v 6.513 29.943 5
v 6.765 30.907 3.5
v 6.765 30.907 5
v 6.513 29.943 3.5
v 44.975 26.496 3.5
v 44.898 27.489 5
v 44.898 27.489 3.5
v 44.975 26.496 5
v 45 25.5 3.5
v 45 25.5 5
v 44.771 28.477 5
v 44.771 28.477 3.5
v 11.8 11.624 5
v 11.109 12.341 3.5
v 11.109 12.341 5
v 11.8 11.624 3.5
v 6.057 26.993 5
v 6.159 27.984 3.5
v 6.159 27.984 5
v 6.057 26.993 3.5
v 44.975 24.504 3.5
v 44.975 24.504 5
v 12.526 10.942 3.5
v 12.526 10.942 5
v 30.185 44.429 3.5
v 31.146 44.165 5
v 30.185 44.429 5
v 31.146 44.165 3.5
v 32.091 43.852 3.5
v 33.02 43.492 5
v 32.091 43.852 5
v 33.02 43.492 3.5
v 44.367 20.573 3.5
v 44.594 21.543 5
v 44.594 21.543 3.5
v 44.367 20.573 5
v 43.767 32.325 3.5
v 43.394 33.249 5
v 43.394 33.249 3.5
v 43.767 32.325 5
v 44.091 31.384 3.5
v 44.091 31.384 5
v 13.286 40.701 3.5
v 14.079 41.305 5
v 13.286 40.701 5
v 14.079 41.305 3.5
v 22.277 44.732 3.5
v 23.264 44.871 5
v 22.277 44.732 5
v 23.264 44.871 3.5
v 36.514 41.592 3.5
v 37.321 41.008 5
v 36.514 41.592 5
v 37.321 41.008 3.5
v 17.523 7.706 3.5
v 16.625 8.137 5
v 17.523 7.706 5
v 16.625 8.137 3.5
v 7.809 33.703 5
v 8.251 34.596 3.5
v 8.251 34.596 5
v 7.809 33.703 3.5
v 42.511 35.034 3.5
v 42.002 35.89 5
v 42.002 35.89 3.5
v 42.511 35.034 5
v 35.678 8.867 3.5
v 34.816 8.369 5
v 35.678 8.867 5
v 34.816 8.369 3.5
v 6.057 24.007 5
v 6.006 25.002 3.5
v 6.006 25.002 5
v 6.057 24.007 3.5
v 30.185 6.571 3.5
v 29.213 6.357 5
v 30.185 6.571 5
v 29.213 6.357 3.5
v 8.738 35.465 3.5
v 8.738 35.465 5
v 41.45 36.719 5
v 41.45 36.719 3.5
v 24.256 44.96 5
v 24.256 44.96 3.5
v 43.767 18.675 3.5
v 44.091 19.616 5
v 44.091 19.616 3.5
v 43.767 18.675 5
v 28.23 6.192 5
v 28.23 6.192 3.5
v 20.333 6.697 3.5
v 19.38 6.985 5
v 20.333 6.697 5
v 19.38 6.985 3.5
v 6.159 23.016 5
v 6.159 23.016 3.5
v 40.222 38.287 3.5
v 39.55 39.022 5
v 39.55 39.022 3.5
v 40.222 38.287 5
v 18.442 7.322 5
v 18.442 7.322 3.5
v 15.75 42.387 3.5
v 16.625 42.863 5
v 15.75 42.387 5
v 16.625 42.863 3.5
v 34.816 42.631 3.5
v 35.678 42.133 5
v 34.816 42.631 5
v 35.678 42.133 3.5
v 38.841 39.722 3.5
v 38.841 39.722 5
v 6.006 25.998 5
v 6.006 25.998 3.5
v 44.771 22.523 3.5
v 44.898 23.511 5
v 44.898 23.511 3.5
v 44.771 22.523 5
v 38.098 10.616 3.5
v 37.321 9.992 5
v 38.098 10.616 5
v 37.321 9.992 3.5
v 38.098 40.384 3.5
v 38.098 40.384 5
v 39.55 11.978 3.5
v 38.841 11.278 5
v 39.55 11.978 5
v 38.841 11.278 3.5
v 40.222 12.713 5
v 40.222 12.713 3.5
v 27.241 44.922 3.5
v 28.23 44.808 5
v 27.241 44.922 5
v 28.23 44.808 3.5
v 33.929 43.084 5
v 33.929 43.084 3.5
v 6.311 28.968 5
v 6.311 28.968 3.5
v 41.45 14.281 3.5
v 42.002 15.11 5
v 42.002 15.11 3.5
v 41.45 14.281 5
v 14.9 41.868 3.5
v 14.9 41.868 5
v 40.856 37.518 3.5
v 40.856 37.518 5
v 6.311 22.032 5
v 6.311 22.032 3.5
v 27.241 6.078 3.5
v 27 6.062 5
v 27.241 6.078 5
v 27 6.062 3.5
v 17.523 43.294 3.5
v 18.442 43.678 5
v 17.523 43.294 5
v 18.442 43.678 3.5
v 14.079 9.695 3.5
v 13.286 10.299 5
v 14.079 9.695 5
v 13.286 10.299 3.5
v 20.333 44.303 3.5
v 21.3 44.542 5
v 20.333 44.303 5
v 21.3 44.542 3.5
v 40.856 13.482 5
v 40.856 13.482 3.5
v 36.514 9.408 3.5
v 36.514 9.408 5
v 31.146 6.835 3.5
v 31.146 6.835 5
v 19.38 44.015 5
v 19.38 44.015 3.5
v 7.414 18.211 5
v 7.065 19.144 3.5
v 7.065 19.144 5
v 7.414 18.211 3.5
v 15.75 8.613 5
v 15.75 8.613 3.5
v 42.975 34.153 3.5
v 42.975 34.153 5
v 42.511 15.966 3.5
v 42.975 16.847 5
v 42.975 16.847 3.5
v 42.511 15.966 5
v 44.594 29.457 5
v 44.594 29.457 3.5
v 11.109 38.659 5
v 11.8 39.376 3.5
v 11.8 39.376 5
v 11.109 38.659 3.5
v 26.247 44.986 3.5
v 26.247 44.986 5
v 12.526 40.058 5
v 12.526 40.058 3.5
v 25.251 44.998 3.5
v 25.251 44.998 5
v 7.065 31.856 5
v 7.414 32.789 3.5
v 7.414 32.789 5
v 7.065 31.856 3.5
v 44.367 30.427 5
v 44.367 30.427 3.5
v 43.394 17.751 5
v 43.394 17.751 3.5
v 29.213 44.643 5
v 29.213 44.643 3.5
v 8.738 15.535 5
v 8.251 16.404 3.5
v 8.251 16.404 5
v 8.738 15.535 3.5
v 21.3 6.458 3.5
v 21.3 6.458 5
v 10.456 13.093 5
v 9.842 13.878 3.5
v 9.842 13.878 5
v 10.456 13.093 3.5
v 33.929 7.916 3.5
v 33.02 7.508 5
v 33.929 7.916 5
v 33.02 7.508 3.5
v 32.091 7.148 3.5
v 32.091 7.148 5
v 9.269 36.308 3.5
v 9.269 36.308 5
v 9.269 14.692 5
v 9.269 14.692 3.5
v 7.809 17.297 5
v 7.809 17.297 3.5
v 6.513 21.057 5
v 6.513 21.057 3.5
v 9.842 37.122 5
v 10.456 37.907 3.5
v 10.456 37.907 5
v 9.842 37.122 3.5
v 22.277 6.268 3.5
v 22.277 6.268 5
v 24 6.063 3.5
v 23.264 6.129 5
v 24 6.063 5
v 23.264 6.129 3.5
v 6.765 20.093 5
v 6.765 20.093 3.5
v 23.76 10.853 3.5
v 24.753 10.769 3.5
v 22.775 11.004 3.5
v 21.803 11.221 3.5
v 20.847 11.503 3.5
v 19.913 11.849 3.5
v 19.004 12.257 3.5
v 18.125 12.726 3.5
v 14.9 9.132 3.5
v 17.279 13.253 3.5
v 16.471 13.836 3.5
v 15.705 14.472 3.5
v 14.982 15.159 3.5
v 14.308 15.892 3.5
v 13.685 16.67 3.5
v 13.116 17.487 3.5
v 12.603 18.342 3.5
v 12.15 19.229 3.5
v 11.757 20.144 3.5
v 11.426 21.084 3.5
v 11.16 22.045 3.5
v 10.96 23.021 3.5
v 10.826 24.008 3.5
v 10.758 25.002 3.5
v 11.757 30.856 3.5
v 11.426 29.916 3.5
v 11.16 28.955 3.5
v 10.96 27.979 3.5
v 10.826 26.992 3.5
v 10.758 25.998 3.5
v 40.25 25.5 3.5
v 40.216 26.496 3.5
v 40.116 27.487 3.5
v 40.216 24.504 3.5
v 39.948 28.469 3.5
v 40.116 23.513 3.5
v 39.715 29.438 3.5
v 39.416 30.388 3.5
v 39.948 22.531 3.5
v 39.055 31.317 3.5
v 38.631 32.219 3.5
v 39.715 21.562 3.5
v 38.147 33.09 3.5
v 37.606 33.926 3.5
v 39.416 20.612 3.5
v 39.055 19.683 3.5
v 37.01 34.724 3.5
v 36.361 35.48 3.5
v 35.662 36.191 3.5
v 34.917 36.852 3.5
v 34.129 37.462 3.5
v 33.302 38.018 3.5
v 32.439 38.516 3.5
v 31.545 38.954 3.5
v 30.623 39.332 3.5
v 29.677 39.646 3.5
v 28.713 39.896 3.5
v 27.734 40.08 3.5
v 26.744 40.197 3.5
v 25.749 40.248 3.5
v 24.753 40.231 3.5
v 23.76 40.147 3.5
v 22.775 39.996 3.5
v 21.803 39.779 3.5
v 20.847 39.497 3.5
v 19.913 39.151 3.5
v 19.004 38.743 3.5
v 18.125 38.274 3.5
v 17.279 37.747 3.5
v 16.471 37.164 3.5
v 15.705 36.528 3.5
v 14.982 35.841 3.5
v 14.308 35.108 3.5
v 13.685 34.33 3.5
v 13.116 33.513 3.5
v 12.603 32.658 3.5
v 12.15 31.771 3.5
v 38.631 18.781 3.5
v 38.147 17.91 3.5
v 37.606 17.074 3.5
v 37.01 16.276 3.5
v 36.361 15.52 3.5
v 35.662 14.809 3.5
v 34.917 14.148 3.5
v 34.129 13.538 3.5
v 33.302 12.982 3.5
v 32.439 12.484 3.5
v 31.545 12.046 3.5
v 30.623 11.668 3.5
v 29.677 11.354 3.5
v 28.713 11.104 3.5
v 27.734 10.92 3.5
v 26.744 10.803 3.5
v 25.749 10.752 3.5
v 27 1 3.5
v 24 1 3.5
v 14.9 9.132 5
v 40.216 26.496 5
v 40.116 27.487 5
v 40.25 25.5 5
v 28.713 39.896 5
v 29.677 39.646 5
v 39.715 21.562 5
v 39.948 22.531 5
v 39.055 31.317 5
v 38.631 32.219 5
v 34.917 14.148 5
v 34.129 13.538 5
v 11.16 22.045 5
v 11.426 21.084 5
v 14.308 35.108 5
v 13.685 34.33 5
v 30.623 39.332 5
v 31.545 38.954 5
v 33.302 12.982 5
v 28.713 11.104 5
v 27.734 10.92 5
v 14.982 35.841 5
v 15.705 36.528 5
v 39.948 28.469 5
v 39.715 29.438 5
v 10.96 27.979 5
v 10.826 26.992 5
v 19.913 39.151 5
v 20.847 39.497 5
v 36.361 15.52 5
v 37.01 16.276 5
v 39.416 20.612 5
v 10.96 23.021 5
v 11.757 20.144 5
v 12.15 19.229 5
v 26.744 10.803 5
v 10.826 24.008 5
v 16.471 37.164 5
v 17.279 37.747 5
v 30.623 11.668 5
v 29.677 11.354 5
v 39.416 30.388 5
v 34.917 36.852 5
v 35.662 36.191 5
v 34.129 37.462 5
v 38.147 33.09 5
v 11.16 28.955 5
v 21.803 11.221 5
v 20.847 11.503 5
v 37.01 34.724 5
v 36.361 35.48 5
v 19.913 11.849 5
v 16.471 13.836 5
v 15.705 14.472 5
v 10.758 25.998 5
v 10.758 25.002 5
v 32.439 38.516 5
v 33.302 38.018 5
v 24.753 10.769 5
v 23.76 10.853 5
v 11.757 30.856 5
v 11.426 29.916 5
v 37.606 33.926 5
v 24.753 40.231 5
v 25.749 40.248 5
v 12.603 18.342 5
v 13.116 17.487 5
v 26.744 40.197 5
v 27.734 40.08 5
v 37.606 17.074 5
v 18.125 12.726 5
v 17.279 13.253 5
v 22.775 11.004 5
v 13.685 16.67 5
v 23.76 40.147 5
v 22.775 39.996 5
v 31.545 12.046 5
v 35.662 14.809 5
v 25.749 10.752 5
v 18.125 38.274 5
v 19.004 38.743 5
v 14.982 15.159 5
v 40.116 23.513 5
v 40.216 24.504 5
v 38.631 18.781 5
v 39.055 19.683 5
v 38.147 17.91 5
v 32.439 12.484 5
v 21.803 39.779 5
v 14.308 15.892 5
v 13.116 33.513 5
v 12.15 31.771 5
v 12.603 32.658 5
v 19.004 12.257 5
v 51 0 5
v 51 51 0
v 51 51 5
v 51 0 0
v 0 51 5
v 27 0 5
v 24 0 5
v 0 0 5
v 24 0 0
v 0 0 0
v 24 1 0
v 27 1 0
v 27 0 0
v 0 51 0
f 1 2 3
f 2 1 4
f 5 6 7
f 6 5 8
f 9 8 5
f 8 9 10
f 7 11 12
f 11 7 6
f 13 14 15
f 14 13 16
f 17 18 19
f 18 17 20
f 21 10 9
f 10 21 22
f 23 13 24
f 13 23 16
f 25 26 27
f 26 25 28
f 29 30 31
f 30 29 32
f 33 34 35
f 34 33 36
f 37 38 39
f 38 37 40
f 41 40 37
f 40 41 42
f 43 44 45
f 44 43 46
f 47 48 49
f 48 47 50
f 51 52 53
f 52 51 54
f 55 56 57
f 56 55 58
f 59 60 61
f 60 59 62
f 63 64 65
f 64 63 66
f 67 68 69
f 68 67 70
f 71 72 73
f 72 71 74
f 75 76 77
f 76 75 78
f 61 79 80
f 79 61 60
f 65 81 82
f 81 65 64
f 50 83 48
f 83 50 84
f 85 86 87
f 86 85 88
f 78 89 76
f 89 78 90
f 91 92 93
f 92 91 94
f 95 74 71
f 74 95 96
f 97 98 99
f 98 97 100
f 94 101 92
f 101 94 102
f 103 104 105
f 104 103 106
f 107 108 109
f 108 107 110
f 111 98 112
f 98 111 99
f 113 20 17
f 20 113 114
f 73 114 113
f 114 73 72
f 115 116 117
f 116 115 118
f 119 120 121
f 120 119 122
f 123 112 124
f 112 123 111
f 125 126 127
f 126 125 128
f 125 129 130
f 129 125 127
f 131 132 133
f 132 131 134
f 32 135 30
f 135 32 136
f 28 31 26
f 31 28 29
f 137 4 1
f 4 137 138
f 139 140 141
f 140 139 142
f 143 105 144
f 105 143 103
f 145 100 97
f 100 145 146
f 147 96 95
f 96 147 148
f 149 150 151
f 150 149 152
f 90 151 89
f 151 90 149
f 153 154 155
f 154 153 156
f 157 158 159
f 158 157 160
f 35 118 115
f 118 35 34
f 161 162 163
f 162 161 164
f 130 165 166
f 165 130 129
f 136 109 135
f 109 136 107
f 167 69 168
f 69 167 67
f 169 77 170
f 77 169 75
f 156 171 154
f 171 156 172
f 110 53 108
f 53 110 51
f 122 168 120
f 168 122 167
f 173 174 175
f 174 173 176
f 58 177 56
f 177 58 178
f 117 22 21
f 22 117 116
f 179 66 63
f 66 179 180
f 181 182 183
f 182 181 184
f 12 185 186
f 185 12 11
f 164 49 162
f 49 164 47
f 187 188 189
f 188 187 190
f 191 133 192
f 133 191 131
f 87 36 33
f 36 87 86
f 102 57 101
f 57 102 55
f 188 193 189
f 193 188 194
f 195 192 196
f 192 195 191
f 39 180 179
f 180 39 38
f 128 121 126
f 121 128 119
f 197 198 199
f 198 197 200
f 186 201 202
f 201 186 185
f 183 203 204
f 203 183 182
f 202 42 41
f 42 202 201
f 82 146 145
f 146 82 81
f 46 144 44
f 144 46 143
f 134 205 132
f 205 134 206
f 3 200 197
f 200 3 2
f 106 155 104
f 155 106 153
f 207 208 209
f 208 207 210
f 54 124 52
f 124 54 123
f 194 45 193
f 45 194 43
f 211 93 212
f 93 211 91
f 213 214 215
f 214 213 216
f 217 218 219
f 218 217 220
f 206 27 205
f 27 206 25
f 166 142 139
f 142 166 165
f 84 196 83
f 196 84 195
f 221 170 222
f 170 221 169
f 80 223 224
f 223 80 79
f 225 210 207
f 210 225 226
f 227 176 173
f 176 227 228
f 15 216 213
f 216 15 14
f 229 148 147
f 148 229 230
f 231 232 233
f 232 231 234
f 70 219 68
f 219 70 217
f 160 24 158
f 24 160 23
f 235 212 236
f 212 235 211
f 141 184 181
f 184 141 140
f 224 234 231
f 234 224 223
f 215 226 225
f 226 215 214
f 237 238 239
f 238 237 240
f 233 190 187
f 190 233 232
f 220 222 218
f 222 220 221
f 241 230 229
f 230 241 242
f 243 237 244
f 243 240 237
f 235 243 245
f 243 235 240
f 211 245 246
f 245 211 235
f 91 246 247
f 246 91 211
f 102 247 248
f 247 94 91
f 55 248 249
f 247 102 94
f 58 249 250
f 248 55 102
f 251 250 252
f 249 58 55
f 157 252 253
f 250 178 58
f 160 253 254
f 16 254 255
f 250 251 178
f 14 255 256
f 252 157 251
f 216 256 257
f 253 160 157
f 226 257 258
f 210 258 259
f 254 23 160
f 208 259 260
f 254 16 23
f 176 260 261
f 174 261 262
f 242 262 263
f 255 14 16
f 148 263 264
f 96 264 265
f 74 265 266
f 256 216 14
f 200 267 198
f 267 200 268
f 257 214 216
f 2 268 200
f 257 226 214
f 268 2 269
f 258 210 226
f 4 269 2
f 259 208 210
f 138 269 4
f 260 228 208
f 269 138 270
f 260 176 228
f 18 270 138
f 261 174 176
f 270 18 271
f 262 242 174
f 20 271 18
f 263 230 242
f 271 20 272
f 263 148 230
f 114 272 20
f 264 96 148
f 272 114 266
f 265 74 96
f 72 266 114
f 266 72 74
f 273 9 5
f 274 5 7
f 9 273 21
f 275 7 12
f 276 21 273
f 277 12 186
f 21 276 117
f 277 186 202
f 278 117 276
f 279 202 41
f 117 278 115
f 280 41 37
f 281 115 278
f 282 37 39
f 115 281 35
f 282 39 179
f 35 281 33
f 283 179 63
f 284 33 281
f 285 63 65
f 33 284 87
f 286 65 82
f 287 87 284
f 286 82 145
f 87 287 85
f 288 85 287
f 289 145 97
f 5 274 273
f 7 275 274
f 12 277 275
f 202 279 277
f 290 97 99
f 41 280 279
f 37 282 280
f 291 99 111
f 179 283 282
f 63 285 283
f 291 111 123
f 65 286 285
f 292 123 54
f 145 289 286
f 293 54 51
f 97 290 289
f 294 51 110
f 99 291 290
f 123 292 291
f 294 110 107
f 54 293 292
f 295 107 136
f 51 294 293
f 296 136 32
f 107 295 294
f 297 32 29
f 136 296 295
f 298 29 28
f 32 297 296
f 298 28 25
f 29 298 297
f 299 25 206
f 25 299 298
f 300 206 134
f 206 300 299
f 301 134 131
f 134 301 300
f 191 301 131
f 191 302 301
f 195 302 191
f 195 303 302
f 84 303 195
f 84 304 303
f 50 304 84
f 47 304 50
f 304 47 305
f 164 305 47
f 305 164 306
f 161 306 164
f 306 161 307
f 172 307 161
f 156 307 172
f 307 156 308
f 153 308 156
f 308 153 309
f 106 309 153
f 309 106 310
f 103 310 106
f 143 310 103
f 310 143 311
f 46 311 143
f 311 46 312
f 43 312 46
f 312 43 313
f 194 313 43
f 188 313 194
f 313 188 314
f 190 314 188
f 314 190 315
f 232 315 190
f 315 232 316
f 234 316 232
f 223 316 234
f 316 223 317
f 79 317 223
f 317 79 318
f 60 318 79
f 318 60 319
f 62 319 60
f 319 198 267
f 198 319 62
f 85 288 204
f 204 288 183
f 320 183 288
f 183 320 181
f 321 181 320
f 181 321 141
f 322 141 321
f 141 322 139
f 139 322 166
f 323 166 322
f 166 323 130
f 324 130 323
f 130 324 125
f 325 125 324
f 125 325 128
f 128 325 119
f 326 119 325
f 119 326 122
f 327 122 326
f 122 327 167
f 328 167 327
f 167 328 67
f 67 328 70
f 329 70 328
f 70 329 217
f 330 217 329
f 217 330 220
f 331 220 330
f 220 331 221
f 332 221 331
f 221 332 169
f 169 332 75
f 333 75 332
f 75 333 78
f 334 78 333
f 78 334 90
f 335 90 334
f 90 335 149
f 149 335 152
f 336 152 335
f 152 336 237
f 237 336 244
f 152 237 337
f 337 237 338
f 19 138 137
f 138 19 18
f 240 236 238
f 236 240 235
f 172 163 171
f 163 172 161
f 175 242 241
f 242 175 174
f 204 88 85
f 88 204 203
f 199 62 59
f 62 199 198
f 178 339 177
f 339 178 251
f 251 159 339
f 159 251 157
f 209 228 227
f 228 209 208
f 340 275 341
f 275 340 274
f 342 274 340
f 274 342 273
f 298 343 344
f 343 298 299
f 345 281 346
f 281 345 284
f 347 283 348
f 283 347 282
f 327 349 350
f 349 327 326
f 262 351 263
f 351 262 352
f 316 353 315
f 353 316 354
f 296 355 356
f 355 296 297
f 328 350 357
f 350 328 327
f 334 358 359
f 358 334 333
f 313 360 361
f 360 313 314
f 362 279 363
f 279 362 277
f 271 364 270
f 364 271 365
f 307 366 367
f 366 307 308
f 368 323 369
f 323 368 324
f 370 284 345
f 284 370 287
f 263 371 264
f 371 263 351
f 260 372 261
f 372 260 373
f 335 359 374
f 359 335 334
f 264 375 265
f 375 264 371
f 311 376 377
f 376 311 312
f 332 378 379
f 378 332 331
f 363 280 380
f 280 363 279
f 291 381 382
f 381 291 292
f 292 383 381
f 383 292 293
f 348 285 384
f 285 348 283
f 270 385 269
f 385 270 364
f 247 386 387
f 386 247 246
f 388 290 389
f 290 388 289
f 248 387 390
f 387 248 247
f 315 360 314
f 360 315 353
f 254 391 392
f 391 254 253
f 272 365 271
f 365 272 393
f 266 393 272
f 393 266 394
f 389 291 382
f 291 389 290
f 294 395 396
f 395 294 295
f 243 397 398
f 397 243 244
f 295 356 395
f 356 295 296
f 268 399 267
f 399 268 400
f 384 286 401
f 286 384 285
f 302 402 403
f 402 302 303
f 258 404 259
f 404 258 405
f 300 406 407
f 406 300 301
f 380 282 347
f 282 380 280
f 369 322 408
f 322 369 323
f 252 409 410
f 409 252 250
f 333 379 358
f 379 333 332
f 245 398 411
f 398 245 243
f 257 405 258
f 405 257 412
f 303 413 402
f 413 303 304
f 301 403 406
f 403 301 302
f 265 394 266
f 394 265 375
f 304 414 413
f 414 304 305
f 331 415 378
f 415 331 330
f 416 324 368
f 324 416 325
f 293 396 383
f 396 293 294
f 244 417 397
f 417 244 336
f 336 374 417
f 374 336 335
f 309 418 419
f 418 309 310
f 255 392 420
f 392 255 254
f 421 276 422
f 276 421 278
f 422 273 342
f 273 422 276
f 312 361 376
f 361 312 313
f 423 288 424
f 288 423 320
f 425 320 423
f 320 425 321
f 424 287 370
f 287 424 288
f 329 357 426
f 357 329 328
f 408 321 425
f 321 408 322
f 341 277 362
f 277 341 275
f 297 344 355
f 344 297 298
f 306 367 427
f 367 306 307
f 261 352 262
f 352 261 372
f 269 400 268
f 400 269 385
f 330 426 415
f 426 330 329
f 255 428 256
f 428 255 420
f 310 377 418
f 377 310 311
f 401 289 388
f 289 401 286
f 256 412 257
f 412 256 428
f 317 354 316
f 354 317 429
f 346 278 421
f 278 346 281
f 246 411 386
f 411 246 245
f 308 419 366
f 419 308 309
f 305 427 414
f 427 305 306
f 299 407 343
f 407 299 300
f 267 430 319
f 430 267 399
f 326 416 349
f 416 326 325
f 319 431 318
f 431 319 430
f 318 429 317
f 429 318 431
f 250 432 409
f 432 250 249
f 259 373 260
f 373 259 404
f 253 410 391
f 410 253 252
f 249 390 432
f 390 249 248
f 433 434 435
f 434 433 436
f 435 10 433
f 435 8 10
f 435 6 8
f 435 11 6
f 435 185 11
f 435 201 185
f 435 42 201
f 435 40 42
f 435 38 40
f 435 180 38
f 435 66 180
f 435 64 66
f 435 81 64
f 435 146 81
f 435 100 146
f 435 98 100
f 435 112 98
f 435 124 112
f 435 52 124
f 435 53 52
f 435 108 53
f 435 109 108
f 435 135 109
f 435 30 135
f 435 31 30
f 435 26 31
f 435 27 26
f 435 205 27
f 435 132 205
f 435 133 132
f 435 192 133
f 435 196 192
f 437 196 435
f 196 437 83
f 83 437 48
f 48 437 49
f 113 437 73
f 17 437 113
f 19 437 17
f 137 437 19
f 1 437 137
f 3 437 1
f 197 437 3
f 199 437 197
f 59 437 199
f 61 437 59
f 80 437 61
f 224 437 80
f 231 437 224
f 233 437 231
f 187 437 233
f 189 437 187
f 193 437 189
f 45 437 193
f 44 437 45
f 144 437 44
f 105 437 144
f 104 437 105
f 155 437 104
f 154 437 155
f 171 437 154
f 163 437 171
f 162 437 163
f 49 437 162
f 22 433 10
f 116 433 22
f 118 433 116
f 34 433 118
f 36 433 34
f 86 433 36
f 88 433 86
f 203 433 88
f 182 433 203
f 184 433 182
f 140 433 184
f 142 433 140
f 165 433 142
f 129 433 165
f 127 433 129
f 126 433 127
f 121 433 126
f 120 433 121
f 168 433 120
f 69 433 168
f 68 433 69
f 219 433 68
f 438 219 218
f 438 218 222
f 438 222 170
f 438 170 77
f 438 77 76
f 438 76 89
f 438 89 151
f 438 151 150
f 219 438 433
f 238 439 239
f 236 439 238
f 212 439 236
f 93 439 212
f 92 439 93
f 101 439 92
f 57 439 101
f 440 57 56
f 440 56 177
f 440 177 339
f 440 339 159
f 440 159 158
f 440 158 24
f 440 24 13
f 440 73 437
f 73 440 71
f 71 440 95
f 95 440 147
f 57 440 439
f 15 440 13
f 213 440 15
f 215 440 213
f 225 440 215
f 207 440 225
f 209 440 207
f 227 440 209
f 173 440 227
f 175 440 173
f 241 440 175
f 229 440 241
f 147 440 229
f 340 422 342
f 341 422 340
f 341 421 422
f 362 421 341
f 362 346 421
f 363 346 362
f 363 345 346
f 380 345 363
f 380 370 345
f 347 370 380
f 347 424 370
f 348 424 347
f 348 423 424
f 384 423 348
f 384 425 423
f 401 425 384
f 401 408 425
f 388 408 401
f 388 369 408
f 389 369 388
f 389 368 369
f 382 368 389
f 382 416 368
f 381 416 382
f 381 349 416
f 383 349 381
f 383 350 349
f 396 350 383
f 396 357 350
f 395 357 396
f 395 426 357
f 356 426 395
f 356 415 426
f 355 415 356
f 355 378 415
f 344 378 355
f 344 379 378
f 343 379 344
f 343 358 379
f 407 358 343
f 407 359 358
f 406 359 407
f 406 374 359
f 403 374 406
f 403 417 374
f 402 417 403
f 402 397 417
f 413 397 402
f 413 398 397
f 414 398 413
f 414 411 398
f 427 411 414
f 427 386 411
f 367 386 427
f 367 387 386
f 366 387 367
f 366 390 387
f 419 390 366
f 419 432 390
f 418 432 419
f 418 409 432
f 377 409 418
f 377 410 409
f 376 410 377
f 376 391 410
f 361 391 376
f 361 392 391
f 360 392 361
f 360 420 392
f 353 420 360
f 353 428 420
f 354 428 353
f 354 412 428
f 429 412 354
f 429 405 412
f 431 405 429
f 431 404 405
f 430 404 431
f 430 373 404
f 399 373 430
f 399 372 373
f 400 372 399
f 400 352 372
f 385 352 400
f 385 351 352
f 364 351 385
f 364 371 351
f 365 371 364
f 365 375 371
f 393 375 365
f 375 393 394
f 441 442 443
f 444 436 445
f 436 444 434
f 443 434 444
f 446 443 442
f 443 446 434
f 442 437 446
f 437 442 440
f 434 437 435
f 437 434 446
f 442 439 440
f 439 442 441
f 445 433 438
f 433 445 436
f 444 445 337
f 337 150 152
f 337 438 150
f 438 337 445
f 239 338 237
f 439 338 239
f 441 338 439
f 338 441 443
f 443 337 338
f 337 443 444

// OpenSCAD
echo(version=version());

// Values are in millimeters

$fa=1;
$fs=1;

//////////////////
wallThickness=5;

coilDiameter = 39;
coilInnerDiameter = 29.5; //32.5;
coilThickness = 2;
wirePath = 3;

featherWidth = 23;
featherLength = 51;
featherDepth = 8; // includes components
featherCircuitDepth = 2;

baseSize = featherLength;

////////////////////////////
// Coil Mount
translate([0, 0, 0])
difference() {
	cube(size=[baseSize,baseSize,wallThickness]);

	// Cut out a place for the coil
	translate([baseSize/2,baseSize/2,wallThickness-1.5])
		difference() {
			cylinder(h=coilThickness, d=coilDiameter);
			translate([0,0,-1])
				cylinder(h=coilThickness+2, d=coilInnerDiameter);
		}

	// Cutout place for wires to wrap around back
	translate([baseSize/2 - wirePath/2, -1, wallThickness-1.5])
		cube(size=[wirePath, baseSize/2 - coilDiameter/2 + 2, coilThickness]);
	translate([baseSize/2 - wirePath/2, -1, -1])
		cube(size=[wirePath, coilThickness, baseSize/2 - coilDiameter/2 + 2]);

}



//	vim: set ai sw=2 ts=2 :
